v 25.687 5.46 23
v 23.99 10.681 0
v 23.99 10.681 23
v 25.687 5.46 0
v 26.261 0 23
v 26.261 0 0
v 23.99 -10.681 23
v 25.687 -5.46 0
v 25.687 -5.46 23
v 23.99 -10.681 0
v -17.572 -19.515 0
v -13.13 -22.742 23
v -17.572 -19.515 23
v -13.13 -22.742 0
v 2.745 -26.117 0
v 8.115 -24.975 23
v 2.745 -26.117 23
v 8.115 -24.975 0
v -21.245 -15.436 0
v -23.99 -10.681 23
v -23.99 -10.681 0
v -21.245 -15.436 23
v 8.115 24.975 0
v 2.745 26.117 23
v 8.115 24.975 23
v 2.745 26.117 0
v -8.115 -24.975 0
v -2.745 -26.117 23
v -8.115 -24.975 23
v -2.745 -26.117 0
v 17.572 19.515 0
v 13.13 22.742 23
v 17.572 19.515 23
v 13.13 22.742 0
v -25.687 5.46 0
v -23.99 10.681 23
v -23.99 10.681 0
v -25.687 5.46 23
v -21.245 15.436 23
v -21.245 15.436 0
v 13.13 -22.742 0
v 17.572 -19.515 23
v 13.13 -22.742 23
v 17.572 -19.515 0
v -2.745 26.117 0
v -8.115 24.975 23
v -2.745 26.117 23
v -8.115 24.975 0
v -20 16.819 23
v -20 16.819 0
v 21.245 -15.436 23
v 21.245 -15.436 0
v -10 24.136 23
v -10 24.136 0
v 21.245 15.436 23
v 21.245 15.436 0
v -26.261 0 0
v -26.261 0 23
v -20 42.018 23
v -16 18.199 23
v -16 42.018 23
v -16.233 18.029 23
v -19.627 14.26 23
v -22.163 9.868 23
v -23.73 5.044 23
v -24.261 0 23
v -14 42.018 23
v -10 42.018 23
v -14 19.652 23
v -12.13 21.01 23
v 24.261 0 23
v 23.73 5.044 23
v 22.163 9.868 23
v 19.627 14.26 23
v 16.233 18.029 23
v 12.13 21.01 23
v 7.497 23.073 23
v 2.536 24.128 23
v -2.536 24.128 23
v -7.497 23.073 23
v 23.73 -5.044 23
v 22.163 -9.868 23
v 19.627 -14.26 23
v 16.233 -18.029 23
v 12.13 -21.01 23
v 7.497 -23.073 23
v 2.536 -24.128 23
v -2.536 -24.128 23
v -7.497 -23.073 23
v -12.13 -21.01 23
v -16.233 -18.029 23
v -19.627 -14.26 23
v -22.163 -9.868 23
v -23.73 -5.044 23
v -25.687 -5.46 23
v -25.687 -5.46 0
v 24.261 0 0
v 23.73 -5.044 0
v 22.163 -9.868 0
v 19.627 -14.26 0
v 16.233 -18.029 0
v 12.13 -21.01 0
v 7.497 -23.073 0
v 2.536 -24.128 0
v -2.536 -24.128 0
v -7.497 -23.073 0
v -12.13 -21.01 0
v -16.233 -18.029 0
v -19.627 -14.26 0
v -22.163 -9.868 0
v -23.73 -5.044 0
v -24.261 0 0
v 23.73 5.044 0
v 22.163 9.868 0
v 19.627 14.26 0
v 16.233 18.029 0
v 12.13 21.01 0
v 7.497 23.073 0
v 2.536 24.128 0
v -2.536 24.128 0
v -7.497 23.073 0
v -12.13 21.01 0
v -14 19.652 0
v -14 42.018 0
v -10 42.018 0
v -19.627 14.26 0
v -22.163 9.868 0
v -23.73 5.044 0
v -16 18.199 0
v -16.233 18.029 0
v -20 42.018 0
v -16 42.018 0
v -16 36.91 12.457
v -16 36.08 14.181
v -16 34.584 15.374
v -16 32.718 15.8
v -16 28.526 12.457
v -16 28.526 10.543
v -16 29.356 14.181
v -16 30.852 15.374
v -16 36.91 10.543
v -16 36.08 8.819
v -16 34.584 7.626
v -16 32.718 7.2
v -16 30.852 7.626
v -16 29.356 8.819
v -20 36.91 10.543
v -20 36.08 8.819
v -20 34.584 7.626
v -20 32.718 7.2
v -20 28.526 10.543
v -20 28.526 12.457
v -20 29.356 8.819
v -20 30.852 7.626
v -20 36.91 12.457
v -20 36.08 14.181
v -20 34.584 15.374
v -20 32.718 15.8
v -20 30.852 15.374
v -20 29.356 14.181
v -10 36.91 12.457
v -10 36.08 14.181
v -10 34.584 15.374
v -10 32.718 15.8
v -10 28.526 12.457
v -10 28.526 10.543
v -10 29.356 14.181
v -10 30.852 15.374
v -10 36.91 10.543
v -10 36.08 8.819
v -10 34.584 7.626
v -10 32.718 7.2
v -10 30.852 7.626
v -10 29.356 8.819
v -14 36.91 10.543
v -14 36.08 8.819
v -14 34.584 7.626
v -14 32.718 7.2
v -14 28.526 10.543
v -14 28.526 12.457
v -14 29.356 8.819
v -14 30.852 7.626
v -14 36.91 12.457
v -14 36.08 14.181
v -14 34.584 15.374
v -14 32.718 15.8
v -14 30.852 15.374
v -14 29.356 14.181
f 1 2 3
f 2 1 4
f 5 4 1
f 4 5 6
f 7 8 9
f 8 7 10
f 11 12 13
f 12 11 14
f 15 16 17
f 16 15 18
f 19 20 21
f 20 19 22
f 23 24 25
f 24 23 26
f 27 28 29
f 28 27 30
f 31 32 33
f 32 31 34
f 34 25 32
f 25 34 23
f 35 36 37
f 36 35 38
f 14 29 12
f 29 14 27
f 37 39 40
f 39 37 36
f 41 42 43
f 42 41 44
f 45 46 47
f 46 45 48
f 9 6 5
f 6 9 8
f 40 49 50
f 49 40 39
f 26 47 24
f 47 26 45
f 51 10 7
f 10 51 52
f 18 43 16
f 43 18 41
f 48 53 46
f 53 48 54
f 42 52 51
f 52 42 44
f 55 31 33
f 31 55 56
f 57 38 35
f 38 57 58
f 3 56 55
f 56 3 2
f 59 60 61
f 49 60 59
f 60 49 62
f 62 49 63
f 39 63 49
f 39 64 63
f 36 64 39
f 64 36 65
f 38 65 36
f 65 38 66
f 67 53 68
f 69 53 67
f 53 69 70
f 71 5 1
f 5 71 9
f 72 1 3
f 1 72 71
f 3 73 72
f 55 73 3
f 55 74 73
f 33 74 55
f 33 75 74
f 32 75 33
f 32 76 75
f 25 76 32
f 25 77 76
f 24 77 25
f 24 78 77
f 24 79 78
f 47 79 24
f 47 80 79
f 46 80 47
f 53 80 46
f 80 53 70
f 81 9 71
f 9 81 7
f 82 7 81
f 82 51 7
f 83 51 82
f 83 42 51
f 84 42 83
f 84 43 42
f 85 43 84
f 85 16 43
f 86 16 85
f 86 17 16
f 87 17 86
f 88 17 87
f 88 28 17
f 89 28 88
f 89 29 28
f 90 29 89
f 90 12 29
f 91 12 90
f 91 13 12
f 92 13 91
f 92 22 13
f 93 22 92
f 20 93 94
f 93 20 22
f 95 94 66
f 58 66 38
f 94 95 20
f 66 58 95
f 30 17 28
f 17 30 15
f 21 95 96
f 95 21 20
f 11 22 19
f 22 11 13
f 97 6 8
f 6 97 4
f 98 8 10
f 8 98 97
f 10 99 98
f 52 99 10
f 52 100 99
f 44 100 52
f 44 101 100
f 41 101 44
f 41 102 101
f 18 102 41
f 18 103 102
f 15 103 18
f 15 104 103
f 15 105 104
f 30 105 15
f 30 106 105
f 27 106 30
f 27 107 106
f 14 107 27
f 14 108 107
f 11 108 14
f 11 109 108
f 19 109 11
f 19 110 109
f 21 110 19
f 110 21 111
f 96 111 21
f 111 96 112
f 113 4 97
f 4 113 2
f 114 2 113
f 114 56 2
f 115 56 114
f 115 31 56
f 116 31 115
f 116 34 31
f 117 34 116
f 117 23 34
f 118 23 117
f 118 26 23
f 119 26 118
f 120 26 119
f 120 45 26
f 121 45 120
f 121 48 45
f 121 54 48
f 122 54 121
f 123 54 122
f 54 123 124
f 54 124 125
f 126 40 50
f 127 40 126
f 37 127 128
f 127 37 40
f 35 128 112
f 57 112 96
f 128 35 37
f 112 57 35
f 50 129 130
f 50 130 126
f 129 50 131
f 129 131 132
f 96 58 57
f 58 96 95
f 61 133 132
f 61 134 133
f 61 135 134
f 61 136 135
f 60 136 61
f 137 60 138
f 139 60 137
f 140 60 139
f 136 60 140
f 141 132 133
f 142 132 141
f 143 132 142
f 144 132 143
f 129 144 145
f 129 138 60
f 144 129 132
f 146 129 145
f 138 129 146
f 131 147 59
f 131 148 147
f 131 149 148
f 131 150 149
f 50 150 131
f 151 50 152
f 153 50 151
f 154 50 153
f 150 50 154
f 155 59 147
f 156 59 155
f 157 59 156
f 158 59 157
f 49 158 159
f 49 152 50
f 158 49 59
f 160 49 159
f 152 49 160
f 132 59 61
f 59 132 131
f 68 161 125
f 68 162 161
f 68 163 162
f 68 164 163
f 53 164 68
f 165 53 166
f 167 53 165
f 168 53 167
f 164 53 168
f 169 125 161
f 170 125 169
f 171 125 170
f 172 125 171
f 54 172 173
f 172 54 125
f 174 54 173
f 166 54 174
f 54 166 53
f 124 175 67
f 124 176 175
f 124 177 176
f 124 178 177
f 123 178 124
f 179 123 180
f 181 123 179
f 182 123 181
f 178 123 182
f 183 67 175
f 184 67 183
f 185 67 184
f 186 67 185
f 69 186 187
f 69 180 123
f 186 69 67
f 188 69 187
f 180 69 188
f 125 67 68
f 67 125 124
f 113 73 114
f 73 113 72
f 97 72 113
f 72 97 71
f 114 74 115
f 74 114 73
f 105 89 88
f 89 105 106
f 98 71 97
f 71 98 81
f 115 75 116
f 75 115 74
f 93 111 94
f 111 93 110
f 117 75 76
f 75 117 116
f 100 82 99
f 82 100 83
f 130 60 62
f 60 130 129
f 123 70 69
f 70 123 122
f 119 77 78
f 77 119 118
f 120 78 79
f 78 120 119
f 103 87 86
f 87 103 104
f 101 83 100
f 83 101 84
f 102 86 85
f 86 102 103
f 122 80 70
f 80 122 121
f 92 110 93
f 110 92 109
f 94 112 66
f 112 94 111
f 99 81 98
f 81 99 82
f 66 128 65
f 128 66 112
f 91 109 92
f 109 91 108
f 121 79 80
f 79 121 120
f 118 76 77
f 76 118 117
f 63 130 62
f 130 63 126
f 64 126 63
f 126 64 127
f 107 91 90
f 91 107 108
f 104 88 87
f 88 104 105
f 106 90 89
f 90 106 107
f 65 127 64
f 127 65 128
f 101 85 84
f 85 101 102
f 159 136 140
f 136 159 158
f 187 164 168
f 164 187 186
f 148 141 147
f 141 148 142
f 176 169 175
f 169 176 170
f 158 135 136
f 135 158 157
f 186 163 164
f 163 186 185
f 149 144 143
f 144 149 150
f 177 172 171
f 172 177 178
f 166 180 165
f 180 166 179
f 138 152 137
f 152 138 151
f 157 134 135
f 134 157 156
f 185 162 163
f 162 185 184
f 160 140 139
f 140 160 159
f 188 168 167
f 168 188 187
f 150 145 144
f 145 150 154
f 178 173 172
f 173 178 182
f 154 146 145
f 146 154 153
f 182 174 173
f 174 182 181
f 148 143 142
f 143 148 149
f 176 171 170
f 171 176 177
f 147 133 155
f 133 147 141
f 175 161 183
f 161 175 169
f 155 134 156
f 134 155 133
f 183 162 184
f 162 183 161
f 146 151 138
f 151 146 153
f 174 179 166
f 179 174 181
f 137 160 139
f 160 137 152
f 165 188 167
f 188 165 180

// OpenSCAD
// Copyright 2019 Marcos Del Sol Vives
// SPDX-License-Identifier: ISC

inner_radius = 165 / PI / 2 - 2;

outer_radius = inner_radius + 2;

ring_height = 23;

tab_to_center = 20;

tab_thickness = 4;

tab_spacing = 2;

tab_length = 25;

tab_alpha = asin(tab_to_center / outer_radius);
tab_y = outer_radius * cos(tab_alpha);

screw_diameter = 4.3;
screw_margin = 5;

difference() {
    union() {
        cylinder(r=outer_radius, h=ring_height);

        translate([-tab_to_center, 0, 0]) {
            cube([tab_thickness, tab_y + tab_length, ring_height]);
        }

        translate([-tab_to_center + tab_spacing + tab_thickness, 0, 0]) {
            cube([tab_thickness, tab_y + tab_length, ring_height]);
        }
    }
    
    cylinder(r = inner_radius, h = ring_height);
    translate([-tab_to_center + tab_thickness, 0, 0]) {
        cube([tab_spacing, tab_y + tab_length, ring_height]);
    }
    
    translate([-tab_to_center, tab_y + tab_length - screw_diameter - screw_margin, ring_height / 2])
        rotate([0, 90, 0])
            cylinder(r = screw_diameter, h=tab_spacing + tab_thickness * 2);
}
